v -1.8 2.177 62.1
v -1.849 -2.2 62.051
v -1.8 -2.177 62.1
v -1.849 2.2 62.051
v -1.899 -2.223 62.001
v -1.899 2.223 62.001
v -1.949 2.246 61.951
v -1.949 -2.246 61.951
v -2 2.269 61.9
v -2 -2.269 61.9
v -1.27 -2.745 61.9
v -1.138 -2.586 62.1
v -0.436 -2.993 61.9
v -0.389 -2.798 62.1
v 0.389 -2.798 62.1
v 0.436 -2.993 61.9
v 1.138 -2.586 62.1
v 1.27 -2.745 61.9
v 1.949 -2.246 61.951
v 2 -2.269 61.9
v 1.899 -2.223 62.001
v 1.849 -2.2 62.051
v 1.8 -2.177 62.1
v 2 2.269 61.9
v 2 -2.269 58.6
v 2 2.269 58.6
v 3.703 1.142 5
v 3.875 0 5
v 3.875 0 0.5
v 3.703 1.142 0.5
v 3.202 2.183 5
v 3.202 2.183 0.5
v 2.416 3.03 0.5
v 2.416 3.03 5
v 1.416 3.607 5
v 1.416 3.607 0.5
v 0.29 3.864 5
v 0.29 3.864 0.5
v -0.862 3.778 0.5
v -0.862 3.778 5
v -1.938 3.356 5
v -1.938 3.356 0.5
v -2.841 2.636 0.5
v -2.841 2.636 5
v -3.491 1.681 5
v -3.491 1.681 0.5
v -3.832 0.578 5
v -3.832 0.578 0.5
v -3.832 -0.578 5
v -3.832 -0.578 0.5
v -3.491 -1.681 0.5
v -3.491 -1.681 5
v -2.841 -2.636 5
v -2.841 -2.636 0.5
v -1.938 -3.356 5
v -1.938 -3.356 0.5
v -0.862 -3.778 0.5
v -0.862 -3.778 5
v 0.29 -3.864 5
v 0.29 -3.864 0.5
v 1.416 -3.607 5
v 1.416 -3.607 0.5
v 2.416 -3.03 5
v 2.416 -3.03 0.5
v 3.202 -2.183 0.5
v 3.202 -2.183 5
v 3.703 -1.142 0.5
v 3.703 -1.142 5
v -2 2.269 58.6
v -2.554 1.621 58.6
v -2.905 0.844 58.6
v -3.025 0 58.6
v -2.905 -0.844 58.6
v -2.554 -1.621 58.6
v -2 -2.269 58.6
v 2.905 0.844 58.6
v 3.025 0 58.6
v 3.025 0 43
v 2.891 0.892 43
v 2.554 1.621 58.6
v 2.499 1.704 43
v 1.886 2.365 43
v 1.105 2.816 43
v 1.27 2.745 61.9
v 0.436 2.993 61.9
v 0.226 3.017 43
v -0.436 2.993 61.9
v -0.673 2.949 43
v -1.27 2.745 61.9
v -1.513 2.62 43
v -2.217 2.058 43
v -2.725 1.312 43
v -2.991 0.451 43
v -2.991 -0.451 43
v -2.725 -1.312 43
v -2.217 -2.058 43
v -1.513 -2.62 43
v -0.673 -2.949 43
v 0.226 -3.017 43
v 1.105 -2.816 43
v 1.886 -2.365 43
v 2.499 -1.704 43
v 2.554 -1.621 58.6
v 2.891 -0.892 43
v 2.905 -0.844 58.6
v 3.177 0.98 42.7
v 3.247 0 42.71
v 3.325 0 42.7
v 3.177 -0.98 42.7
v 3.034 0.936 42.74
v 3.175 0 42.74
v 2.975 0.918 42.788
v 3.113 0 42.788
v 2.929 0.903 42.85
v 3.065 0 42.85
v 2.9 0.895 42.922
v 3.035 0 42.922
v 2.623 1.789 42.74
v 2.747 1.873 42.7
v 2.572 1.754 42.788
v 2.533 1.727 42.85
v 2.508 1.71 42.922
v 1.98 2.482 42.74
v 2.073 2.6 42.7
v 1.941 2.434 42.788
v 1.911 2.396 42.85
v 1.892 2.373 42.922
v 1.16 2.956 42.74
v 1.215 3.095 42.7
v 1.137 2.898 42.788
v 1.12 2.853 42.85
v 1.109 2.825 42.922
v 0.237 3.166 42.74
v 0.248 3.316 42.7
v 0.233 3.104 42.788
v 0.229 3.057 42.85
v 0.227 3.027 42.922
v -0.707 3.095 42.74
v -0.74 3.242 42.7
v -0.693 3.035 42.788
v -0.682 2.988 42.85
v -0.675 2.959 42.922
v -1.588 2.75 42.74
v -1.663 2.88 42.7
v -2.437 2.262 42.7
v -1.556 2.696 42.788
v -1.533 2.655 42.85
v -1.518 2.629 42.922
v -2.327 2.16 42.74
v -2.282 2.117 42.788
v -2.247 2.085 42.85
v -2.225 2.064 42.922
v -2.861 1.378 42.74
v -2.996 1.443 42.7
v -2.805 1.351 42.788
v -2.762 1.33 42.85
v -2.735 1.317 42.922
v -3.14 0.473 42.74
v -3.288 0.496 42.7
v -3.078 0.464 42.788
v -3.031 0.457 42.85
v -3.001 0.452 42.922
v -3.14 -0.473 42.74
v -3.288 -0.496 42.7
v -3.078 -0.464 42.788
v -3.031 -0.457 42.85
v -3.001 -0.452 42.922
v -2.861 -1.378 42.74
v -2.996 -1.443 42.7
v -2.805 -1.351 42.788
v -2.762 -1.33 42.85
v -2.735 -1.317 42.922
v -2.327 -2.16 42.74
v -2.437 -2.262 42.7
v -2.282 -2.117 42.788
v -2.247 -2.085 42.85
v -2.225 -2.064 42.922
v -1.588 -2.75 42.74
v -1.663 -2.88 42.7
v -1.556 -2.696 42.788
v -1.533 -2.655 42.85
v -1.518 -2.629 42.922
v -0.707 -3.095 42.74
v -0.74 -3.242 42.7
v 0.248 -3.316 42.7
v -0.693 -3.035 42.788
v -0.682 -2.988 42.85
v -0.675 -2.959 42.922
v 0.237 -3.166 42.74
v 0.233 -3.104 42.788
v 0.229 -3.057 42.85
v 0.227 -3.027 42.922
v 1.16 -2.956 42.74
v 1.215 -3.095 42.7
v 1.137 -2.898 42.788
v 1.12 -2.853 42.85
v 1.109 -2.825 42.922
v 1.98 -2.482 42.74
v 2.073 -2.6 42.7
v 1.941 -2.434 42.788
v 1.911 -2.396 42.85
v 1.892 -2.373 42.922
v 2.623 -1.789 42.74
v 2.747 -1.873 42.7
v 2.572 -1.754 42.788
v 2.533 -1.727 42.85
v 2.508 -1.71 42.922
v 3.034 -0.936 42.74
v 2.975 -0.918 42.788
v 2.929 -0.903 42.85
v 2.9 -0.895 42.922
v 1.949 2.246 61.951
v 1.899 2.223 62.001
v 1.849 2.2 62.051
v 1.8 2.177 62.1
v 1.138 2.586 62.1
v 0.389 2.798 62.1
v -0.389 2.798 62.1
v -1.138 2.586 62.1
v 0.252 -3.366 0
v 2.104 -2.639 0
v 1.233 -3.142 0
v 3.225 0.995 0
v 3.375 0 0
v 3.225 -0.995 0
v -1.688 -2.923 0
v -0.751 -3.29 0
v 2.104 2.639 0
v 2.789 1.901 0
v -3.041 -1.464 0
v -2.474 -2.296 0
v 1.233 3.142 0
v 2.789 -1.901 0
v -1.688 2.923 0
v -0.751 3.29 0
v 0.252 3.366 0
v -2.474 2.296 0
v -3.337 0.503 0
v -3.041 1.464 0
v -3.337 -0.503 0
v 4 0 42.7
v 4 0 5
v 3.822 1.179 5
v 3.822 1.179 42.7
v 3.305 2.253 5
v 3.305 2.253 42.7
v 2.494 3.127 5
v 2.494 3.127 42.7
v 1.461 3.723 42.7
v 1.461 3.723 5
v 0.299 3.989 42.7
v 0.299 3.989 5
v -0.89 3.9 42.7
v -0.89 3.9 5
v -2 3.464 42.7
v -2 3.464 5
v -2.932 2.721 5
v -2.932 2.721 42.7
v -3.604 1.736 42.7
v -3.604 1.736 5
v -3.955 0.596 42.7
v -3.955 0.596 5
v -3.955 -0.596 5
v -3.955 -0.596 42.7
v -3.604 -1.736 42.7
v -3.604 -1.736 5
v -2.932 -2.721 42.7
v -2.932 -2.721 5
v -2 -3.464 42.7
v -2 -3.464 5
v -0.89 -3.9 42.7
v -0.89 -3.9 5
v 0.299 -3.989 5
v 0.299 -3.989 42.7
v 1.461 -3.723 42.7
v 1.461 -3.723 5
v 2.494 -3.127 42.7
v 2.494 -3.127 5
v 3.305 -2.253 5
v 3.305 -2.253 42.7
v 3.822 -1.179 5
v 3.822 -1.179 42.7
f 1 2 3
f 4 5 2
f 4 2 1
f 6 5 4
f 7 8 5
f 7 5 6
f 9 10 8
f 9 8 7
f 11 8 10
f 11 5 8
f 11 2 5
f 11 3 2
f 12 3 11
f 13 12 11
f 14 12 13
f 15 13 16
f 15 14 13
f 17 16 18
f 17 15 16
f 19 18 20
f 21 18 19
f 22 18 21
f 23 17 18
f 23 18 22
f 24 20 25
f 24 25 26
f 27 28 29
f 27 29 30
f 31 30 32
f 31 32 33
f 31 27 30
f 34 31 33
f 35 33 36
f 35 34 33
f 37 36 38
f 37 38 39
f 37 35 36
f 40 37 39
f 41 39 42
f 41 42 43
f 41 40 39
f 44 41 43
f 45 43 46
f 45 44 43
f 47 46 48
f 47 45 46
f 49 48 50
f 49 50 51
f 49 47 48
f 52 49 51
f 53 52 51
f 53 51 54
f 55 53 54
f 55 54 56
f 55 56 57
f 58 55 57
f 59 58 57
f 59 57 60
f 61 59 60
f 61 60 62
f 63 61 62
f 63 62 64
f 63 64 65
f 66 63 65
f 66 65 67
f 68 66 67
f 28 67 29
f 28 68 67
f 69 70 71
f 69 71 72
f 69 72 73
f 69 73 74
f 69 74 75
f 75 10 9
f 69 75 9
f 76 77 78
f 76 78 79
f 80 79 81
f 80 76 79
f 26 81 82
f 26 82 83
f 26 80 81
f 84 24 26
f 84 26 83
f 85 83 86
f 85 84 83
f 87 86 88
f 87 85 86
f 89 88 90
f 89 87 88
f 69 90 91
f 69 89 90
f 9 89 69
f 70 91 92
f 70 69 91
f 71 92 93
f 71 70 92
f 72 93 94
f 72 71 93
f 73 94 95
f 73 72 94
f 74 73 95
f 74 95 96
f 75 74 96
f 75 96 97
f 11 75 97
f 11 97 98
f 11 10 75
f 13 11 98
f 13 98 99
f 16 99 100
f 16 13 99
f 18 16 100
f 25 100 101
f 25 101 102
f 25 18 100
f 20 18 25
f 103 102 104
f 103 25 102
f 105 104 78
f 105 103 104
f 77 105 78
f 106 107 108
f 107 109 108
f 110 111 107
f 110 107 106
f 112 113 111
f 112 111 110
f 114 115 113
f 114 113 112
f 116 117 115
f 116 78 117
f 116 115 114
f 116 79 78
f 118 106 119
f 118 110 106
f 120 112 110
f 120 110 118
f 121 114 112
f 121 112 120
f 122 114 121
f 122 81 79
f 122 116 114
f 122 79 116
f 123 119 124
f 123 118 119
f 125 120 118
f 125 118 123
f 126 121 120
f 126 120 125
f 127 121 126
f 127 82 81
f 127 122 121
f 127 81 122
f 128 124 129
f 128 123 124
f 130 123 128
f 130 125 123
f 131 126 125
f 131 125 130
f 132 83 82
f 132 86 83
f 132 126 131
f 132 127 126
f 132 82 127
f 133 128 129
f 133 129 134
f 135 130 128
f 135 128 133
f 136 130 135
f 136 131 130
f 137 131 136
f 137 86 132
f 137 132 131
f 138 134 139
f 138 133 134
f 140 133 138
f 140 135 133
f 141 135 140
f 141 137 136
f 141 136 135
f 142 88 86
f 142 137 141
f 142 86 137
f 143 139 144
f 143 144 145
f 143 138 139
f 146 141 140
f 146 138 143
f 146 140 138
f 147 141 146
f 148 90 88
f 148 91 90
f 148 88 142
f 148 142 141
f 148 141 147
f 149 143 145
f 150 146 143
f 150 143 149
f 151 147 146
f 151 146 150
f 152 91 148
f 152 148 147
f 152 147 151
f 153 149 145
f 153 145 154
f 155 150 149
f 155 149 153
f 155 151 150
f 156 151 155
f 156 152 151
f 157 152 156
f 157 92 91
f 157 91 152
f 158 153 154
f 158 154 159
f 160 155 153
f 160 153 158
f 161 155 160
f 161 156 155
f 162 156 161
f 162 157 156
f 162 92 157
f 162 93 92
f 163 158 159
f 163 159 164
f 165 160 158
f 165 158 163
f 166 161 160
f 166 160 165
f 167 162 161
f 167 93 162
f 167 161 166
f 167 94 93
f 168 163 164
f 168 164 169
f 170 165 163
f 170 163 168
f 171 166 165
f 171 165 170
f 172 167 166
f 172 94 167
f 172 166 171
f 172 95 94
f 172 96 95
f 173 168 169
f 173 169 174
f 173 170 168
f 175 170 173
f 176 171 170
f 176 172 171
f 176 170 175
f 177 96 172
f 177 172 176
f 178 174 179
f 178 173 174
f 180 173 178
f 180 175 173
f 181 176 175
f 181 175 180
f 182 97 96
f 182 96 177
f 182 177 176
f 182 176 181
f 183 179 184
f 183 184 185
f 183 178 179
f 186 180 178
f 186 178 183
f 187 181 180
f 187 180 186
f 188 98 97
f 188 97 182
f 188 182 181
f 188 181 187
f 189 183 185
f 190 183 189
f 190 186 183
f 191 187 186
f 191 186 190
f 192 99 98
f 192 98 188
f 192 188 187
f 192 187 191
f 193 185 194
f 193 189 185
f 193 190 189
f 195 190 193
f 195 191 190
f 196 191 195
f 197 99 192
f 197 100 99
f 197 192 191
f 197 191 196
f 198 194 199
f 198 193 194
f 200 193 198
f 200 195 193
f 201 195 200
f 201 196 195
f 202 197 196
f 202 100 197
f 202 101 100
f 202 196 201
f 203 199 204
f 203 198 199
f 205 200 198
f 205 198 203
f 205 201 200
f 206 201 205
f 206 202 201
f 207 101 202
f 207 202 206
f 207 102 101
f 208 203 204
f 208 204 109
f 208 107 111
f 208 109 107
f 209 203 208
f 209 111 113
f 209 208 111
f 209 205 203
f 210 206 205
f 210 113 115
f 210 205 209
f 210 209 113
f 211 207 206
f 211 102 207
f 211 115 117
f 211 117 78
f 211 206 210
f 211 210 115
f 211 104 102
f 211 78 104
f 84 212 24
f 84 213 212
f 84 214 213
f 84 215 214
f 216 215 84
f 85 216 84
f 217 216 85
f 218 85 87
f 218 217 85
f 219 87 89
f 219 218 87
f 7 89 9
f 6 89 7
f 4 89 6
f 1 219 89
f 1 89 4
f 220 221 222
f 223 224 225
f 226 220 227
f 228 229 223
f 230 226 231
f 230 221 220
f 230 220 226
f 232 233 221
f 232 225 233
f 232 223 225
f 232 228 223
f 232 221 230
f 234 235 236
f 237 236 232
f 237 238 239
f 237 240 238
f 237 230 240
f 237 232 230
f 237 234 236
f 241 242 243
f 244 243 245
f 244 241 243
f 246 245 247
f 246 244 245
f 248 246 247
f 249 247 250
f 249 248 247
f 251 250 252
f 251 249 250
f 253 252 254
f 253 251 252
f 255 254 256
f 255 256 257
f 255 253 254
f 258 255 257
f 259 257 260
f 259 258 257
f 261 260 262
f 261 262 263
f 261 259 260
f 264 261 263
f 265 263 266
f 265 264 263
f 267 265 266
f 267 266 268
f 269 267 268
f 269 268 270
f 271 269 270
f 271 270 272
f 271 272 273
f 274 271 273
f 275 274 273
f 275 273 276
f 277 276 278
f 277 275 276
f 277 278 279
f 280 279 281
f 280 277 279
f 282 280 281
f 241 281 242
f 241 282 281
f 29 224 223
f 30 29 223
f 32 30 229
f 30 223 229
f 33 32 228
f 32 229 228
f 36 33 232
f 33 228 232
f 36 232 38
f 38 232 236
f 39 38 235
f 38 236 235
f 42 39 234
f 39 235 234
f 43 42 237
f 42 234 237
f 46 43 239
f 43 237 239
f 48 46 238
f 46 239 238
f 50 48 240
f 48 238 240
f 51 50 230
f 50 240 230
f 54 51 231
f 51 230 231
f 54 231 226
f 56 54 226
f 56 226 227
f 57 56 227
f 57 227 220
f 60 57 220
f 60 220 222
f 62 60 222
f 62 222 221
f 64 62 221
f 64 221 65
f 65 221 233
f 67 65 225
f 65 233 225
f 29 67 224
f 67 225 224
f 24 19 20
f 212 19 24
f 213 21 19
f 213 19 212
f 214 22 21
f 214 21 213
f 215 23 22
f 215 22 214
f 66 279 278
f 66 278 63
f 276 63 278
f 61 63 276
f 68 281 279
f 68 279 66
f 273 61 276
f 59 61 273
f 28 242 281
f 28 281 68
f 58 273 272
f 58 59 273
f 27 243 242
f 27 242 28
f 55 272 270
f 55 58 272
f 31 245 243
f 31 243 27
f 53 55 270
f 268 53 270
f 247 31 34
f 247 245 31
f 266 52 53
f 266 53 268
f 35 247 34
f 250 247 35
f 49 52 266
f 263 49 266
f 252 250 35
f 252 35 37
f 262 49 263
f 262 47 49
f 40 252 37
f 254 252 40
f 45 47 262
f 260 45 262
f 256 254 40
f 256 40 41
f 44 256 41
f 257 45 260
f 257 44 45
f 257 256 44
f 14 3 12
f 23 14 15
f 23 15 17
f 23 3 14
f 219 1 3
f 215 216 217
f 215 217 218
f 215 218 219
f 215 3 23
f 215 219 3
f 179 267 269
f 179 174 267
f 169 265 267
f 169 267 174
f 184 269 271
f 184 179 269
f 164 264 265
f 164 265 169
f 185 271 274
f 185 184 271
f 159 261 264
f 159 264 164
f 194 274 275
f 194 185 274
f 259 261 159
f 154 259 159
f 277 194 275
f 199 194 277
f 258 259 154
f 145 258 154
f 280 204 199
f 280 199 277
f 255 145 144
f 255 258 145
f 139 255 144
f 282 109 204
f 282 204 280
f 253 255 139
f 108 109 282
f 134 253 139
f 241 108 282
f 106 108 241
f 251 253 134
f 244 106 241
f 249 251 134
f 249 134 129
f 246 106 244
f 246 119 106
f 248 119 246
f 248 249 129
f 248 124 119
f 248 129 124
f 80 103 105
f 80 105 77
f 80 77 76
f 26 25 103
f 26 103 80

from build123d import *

# Parameters (mm, degrees)
F2_R     = 0.3
F3_SIZE2 = 0.5
F3_SIZE  = 0.5
F4_W     = 4
F4_H     = 6
F5_DEPTH = 3.5
F6_SIZE2 = 0.2
F6_SIZE  = 0.2


with BuildPart() as f1:
    # F0 (on Front) → F1 (revolve)
    with BuildSketch(Plane.XZ):
        Polygon((0, 62.1), (0, 0), (3.875, 0), (3.875, 5), (4, 5), (4, 42.7), (3.025, 42.7), (3.025, 62.1), align=None)
    revolve(axis=Axis((0, 0, 31.05), (0, 0, 1)))

    # F2
    f2_edges = [f1.edges().sort_by_distance(p)[0] for p in [
        (-3.025, 0, 42.7),
    ]]
    fillet(f2_edges, radius=F2_R)

    # F3
    f3_edges = [f1.edges().sort_by_distance(p)[0] for p in [
        (-3.875, 0, 0),
    ]]
    chamfer(f3_edges, length=F3_SIZE, length2=F3_SIZE2)

    # F4 (on face) → F5 (cut)
    with BuildSketch(Plane.XY.offset(62.1)):
        with Locations((-4, 0)):
            Rectangle(F4_W, F4_H)
        with Locations((4, 0)):
            Rectangle(F4_W, F4_H)
    extrude(amount=-F5_DEPTH, mode=Mode.SUBTRACT)

    # F6
    f6_edges = [f1.edges().sort_by_distance(p)[0] for p in [
        (2, 0, 62.1),
        (0, 3.025, 62.1),
        (0, -3.025, 62.1),
        (-2, 0, 62.1),
    ]]
    chamfer(f6_edges, length=F6_SIZE, length2=F6_SIZE2)


solid = f1.part
